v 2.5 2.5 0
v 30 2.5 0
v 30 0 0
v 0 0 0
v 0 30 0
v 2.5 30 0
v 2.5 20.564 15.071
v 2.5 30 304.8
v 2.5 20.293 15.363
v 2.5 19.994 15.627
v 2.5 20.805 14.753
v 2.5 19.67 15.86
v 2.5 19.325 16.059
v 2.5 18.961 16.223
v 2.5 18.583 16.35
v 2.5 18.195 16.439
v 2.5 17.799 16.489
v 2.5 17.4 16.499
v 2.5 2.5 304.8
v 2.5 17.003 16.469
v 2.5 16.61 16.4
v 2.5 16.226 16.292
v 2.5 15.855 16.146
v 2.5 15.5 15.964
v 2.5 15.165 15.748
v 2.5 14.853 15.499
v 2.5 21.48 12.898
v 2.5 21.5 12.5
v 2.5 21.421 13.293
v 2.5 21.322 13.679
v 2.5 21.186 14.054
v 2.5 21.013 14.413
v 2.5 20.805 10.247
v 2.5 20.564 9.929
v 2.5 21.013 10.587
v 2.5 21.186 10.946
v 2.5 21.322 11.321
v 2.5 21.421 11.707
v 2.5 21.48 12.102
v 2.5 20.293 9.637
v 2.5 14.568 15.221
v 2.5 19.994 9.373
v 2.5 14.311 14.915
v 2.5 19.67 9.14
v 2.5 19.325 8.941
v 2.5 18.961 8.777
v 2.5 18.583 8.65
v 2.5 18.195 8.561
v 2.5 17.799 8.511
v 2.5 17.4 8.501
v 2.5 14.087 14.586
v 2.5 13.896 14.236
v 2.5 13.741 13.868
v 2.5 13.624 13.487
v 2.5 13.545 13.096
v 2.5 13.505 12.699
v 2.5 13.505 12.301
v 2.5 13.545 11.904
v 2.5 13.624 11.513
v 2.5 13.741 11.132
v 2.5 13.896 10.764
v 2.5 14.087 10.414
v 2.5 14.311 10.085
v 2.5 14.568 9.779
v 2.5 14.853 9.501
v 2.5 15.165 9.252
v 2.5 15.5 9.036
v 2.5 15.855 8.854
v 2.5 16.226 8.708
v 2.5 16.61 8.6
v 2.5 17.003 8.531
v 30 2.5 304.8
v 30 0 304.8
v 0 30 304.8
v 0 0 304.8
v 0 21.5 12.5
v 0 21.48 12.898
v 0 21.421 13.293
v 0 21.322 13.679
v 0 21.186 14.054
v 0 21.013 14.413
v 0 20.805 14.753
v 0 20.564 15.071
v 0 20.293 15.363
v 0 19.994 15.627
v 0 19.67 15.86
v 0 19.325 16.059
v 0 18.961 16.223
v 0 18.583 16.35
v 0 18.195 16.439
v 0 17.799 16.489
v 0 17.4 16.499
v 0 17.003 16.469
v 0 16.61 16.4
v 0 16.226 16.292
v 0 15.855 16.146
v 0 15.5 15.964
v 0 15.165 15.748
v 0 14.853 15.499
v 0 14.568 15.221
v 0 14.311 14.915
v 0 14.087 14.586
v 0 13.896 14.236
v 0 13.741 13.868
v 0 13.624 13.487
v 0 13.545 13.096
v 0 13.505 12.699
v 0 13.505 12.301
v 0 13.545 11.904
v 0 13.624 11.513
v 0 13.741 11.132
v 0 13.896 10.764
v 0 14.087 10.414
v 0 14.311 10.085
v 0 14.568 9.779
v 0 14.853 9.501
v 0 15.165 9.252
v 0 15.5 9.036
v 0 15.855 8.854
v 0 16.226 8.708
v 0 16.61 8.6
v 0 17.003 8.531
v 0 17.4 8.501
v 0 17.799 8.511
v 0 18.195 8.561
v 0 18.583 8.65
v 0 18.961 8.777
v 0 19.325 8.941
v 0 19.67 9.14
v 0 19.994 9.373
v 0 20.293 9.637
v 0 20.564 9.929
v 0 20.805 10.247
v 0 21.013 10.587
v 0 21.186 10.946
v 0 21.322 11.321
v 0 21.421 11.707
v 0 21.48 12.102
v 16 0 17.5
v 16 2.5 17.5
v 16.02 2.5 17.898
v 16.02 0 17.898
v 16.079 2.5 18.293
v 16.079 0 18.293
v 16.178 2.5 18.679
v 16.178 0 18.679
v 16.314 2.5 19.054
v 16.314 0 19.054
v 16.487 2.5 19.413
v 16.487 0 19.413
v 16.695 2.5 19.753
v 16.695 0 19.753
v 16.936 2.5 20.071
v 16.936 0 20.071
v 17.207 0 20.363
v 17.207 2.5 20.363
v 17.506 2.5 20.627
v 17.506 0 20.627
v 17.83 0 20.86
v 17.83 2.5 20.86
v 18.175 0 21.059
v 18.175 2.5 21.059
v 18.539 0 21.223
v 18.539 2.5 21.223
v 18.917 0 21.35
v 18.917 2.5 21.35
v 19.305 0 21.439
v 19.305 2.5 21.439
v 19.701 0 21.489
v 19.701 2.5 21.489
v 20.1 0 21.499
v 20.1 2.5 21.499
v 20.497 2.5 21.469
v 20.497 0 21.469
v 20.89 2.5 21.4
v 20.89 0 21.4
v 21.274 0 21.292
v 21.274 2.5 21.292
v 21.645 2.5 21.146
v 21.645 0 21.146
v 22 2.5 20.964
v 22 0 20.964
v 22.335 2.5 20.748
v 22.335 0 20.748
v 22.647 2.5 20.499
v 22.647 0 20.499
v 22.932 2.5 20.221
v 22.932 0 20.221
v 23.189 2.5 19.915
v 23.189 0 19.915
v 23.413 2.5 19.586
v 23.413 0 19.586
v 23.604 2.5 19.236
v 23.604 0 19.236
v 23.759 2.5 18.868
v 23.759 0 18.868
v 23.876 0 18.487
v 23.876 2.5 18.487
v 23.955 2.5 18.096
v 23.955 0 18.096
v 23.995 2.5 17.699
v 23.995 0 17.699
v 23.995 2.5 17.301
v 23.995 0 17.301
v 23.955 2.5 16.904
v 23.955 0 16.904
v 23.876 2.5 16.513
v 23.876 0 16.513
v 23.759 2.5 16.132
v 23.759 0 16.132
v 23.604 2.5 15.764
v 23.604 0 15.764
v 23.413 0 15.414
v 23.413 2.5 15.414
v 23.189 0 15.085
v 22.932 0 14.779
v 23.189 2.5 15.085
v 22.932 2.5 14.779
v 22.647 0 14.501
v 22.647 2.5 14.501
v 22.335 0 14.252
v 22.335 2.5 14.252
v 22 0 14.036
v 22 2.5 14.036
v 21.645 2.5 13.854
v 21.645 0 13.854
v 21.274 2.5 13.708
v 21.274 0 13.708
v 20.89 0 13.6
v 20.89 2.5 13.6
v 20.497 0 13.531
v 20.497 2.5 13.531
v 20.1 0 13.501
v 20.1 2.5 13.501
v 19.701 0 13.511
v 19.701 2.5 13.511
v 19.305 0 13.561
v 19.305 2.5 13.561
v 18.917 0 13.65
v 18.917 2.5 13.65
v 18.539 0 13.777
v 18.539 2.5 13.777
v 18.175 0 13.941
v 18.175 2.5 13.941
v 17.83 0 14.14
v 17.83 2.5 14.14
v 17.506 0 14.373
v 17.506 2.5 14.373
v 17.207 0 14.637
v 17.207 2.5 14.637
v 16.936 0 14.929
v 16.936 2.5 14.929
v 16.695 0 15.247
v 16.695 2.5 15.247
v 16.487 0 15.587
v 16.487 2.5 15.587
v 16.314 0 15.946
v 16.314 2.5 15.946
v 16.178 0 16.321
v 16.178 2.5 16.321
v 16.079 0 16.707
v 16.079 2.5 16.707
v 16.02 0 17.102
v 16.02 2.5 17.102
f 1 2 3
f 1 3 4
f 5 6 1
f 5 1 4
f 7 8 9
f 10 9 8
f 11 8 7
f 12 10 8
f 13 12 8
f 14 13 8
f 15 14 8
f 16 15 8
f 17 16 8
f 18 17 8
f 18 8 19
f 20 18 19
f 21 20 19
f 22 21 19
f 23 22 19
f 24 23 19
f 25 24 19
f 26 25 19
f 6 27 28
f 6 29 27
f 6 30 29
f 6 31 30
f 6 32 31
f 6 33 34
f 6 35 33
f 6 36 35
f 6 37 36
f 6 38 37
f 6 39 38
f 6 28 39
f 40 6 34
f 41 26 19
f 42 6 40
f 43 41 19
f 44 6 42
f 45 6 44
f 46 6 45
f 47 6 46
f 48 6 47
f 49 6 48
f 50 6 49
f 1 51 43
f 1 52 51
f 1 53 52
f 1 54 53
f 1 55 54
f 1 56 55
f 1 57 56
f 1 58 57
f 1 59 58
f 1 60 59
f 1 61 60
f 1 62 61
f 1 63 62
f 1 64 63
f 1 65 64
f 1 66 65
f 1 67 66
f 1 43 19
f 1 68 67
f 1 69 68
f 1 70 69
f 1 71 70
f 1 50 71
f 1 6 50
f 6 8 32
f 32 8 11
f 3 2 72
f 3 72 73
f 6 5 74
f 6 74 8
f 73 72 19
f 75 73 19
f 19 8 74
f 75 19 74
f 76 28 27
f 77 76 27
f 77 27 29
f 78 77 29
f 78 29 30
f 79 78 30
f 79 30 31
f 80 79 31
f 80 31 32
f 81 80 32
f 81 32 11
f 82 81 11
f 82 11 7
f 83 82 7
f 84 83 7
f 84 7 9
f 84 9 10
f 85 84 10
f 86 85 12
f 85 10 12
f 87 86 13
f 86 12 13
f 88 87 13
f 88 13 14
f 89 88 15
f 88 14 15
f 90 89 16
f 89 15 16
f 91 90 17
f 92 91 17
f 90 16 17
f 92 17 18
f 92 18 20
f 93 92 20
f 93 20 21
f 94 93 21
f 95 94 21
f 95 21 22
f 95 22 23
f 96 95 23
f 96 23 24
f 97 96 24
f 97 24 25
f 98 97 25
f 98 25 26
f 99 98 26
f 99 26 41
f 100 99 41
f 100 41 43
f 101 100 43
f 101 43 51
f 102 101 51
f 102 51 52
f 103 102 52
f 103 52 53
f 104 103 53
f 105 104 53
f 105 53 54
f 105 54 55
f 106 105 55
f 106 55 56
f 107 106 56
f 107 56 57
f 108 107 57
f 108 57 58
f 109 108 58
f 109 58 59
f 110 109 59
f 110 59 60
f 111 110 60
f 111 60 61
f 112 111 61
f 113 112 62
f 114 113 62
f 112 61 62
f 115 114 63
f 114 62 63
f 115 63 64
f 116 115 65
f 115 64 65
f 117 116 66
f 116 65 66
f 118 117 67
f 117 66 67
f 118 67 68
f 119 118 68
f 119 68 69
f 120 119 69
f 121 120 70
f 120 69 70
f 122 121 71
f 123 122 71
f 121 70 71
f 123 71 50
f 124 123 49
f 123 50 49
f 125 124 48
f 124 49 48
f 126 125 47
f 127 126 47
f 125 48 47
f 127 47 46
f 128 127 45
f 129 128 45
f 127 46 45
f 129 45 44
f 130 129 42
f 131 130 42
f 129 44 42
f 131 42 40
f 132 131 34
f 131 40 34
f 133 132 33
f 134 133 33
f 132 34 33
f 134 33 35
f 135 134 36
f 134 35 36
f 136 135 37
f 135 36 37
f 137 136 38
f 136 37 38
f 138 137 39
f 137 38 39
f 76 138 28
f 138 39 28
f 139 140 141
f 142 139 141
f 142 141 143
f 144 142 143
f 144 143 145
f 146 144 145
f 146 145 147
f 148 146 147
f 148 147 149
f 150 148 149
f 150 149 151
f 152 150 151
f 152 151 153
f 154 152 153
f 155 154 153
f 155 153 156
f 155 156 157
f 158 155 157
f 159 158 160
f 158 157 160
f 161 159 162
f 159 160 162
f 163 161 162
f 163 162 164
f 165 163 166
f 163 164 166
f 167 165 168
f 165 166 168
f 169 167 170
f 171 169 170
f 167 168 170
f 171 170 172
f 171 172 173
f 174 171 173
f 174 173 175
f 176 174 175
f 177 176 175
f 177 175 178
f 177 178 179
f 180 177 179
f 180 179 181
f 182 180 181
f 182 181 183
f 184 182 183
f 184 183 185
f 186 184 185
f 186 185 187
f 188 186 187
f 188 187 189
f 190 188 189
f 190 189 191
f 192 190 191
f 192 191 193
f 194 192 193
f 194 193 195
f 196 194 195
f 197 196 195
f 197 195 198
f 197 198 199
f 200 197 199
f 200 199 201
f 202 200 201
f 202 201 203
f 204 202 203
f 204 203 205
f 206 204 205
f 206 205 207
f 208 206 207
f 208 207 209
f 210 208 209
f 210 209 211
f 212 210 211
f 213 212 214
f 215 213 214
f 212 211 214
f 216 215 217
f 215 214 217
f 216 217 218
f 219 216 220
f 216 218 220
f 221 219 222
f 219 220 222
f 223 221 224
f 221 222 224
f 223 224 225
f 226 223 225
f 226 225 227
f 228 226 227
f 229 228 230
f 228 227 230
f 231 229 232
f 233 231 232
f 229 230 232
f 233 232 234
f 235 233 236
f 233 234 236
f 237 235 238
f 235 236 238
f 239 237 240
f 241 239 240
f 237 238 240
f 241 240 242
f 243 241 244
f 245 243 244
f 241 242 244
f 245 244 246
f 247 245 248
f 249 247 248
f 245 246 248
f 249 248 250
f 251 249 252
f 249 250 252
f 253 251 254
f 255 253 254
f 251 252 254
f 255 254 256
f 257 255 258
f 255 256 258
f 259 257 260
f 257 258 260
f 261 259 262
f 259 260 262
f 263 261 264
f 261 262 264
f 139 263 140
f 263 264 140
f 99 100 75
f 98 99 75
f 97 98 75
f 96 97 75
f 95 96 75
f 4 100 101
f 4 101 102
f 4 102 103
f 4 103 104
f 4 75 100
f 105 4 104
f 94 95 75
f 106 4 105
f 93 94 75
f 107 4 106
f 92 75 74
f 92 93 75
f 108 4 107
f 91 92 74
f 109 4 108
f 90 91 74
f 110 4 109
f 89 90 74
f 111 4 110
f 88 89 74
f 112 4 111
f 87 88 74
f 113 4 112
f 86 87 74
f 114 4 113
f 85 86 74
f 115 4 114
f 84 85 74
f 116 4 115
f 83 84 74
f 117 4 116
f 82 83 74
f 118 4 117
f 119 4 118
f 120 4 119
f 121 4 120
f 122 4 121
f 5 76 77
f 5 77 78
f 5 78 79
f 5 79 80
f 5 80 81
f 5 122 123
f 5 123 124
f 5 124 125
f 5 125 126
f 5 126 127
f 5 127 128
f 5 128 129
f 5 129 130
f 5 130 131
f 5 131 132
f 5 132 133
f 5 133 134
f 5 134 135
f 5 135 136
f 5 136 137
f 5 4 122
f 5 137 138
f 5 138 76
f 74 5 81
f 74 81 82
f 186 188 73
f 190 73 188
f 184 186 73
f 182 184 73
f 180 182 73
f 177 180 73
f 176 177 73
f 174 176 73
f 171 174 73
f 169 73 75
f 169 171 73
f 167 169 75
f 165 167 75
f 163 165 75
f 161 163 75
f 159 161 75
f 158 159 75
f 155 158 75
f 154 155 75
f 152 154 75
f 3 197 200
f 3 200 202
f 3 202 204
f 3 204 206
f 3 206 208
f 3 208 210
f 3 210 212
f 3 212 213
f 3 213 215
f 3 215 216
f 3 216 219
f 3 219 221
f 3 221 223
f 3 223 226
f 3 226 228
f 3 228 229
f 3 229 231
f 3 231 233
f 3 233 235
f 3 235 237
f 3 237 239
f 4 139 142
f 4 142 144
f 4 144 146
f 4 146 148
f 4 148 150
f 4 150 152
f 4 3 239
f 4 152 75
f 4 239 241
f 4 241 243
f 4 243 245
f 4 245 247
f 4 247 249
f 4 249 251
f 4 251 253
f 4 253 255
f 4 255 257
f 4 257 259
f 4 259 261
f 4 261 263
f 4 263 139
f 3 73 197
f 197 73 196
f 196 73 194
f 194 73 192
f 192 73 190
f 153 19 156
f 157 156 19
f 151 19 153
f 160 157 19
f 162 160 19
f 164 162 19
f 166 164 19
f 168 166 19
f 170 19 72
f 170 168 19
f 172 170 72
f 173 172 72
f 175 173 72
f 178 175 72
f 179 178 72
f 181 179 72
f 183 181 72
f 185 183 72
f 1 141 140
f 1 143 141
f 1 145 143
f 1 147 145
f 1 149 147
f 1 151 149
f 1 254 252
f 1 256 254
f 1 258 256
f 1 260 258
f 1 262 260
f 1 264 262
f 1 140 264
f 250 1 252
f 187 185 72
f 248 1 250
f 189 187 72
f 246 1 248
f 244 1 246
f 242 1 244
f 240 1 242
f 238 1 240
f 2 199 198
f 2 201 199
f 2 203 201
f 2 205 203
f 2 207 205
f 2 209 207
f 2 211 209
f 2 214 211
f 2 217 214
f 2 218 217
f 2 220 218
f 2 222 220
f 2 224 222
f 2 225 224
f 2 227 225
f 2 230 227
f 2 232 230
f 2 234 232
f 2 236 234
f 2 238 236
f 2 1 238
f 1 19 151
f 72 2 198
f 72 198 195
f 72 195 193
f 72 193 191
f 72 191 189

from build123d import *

# Parameters (mm, degrees)
BOSS_EXTRUDE1_DEPTH = 304.8
SKETCH2_R           = 4
CUT_EXTRUDE1_DEPTH  = 308.50494305
SKETCH3_R           = 4
CUT_EXTRUDE2_DEPTH  = 308.50494305


with BuildPart() as part:
    # Sketch1 → Boss-Extrude1 (new body)
    with BuildSketch(Plane.XY):
        Polygon((0, 0), (0, 30), (2.5, 30), (2.5, 2.5), (30, 2.5), (30, 0), align=None)
    extrude(amount=BOSS_EXTRUDE1_DEPTH)

    # Sketch2 → Cut-Extrude1 (cut, through all)
    with BuildSketch(Plane(origin=(0, 2.5, 0), x_dir=(1, 0, 0), z_dir=(0, 1, 0))):
        with Locations(Location((20, -17.5, 0), (0, 0, 180))):
            Circle(SKETCH2_R)
    extrude(amount=-CUT_EXTRUDE1_DEPTH, mode=Mode.SUBTRACT)

    # Sketch3 → Cut-Extrude2 (cut, through all)
    with BuildSketch(Plane(origin=(2.5, 0, 0), x_dir=(0, 0, -1), z_dir=(1, 0, 0))):
        with Locations(Location((-12.5, 17.5, 0), (0, 0, 90))):
            Circle(SKETCH3_R)
    extrude(amount=-CUT_EXTRUDE2_DEPTH, mode=Mode.SUBTRACT)


solid = part.part
